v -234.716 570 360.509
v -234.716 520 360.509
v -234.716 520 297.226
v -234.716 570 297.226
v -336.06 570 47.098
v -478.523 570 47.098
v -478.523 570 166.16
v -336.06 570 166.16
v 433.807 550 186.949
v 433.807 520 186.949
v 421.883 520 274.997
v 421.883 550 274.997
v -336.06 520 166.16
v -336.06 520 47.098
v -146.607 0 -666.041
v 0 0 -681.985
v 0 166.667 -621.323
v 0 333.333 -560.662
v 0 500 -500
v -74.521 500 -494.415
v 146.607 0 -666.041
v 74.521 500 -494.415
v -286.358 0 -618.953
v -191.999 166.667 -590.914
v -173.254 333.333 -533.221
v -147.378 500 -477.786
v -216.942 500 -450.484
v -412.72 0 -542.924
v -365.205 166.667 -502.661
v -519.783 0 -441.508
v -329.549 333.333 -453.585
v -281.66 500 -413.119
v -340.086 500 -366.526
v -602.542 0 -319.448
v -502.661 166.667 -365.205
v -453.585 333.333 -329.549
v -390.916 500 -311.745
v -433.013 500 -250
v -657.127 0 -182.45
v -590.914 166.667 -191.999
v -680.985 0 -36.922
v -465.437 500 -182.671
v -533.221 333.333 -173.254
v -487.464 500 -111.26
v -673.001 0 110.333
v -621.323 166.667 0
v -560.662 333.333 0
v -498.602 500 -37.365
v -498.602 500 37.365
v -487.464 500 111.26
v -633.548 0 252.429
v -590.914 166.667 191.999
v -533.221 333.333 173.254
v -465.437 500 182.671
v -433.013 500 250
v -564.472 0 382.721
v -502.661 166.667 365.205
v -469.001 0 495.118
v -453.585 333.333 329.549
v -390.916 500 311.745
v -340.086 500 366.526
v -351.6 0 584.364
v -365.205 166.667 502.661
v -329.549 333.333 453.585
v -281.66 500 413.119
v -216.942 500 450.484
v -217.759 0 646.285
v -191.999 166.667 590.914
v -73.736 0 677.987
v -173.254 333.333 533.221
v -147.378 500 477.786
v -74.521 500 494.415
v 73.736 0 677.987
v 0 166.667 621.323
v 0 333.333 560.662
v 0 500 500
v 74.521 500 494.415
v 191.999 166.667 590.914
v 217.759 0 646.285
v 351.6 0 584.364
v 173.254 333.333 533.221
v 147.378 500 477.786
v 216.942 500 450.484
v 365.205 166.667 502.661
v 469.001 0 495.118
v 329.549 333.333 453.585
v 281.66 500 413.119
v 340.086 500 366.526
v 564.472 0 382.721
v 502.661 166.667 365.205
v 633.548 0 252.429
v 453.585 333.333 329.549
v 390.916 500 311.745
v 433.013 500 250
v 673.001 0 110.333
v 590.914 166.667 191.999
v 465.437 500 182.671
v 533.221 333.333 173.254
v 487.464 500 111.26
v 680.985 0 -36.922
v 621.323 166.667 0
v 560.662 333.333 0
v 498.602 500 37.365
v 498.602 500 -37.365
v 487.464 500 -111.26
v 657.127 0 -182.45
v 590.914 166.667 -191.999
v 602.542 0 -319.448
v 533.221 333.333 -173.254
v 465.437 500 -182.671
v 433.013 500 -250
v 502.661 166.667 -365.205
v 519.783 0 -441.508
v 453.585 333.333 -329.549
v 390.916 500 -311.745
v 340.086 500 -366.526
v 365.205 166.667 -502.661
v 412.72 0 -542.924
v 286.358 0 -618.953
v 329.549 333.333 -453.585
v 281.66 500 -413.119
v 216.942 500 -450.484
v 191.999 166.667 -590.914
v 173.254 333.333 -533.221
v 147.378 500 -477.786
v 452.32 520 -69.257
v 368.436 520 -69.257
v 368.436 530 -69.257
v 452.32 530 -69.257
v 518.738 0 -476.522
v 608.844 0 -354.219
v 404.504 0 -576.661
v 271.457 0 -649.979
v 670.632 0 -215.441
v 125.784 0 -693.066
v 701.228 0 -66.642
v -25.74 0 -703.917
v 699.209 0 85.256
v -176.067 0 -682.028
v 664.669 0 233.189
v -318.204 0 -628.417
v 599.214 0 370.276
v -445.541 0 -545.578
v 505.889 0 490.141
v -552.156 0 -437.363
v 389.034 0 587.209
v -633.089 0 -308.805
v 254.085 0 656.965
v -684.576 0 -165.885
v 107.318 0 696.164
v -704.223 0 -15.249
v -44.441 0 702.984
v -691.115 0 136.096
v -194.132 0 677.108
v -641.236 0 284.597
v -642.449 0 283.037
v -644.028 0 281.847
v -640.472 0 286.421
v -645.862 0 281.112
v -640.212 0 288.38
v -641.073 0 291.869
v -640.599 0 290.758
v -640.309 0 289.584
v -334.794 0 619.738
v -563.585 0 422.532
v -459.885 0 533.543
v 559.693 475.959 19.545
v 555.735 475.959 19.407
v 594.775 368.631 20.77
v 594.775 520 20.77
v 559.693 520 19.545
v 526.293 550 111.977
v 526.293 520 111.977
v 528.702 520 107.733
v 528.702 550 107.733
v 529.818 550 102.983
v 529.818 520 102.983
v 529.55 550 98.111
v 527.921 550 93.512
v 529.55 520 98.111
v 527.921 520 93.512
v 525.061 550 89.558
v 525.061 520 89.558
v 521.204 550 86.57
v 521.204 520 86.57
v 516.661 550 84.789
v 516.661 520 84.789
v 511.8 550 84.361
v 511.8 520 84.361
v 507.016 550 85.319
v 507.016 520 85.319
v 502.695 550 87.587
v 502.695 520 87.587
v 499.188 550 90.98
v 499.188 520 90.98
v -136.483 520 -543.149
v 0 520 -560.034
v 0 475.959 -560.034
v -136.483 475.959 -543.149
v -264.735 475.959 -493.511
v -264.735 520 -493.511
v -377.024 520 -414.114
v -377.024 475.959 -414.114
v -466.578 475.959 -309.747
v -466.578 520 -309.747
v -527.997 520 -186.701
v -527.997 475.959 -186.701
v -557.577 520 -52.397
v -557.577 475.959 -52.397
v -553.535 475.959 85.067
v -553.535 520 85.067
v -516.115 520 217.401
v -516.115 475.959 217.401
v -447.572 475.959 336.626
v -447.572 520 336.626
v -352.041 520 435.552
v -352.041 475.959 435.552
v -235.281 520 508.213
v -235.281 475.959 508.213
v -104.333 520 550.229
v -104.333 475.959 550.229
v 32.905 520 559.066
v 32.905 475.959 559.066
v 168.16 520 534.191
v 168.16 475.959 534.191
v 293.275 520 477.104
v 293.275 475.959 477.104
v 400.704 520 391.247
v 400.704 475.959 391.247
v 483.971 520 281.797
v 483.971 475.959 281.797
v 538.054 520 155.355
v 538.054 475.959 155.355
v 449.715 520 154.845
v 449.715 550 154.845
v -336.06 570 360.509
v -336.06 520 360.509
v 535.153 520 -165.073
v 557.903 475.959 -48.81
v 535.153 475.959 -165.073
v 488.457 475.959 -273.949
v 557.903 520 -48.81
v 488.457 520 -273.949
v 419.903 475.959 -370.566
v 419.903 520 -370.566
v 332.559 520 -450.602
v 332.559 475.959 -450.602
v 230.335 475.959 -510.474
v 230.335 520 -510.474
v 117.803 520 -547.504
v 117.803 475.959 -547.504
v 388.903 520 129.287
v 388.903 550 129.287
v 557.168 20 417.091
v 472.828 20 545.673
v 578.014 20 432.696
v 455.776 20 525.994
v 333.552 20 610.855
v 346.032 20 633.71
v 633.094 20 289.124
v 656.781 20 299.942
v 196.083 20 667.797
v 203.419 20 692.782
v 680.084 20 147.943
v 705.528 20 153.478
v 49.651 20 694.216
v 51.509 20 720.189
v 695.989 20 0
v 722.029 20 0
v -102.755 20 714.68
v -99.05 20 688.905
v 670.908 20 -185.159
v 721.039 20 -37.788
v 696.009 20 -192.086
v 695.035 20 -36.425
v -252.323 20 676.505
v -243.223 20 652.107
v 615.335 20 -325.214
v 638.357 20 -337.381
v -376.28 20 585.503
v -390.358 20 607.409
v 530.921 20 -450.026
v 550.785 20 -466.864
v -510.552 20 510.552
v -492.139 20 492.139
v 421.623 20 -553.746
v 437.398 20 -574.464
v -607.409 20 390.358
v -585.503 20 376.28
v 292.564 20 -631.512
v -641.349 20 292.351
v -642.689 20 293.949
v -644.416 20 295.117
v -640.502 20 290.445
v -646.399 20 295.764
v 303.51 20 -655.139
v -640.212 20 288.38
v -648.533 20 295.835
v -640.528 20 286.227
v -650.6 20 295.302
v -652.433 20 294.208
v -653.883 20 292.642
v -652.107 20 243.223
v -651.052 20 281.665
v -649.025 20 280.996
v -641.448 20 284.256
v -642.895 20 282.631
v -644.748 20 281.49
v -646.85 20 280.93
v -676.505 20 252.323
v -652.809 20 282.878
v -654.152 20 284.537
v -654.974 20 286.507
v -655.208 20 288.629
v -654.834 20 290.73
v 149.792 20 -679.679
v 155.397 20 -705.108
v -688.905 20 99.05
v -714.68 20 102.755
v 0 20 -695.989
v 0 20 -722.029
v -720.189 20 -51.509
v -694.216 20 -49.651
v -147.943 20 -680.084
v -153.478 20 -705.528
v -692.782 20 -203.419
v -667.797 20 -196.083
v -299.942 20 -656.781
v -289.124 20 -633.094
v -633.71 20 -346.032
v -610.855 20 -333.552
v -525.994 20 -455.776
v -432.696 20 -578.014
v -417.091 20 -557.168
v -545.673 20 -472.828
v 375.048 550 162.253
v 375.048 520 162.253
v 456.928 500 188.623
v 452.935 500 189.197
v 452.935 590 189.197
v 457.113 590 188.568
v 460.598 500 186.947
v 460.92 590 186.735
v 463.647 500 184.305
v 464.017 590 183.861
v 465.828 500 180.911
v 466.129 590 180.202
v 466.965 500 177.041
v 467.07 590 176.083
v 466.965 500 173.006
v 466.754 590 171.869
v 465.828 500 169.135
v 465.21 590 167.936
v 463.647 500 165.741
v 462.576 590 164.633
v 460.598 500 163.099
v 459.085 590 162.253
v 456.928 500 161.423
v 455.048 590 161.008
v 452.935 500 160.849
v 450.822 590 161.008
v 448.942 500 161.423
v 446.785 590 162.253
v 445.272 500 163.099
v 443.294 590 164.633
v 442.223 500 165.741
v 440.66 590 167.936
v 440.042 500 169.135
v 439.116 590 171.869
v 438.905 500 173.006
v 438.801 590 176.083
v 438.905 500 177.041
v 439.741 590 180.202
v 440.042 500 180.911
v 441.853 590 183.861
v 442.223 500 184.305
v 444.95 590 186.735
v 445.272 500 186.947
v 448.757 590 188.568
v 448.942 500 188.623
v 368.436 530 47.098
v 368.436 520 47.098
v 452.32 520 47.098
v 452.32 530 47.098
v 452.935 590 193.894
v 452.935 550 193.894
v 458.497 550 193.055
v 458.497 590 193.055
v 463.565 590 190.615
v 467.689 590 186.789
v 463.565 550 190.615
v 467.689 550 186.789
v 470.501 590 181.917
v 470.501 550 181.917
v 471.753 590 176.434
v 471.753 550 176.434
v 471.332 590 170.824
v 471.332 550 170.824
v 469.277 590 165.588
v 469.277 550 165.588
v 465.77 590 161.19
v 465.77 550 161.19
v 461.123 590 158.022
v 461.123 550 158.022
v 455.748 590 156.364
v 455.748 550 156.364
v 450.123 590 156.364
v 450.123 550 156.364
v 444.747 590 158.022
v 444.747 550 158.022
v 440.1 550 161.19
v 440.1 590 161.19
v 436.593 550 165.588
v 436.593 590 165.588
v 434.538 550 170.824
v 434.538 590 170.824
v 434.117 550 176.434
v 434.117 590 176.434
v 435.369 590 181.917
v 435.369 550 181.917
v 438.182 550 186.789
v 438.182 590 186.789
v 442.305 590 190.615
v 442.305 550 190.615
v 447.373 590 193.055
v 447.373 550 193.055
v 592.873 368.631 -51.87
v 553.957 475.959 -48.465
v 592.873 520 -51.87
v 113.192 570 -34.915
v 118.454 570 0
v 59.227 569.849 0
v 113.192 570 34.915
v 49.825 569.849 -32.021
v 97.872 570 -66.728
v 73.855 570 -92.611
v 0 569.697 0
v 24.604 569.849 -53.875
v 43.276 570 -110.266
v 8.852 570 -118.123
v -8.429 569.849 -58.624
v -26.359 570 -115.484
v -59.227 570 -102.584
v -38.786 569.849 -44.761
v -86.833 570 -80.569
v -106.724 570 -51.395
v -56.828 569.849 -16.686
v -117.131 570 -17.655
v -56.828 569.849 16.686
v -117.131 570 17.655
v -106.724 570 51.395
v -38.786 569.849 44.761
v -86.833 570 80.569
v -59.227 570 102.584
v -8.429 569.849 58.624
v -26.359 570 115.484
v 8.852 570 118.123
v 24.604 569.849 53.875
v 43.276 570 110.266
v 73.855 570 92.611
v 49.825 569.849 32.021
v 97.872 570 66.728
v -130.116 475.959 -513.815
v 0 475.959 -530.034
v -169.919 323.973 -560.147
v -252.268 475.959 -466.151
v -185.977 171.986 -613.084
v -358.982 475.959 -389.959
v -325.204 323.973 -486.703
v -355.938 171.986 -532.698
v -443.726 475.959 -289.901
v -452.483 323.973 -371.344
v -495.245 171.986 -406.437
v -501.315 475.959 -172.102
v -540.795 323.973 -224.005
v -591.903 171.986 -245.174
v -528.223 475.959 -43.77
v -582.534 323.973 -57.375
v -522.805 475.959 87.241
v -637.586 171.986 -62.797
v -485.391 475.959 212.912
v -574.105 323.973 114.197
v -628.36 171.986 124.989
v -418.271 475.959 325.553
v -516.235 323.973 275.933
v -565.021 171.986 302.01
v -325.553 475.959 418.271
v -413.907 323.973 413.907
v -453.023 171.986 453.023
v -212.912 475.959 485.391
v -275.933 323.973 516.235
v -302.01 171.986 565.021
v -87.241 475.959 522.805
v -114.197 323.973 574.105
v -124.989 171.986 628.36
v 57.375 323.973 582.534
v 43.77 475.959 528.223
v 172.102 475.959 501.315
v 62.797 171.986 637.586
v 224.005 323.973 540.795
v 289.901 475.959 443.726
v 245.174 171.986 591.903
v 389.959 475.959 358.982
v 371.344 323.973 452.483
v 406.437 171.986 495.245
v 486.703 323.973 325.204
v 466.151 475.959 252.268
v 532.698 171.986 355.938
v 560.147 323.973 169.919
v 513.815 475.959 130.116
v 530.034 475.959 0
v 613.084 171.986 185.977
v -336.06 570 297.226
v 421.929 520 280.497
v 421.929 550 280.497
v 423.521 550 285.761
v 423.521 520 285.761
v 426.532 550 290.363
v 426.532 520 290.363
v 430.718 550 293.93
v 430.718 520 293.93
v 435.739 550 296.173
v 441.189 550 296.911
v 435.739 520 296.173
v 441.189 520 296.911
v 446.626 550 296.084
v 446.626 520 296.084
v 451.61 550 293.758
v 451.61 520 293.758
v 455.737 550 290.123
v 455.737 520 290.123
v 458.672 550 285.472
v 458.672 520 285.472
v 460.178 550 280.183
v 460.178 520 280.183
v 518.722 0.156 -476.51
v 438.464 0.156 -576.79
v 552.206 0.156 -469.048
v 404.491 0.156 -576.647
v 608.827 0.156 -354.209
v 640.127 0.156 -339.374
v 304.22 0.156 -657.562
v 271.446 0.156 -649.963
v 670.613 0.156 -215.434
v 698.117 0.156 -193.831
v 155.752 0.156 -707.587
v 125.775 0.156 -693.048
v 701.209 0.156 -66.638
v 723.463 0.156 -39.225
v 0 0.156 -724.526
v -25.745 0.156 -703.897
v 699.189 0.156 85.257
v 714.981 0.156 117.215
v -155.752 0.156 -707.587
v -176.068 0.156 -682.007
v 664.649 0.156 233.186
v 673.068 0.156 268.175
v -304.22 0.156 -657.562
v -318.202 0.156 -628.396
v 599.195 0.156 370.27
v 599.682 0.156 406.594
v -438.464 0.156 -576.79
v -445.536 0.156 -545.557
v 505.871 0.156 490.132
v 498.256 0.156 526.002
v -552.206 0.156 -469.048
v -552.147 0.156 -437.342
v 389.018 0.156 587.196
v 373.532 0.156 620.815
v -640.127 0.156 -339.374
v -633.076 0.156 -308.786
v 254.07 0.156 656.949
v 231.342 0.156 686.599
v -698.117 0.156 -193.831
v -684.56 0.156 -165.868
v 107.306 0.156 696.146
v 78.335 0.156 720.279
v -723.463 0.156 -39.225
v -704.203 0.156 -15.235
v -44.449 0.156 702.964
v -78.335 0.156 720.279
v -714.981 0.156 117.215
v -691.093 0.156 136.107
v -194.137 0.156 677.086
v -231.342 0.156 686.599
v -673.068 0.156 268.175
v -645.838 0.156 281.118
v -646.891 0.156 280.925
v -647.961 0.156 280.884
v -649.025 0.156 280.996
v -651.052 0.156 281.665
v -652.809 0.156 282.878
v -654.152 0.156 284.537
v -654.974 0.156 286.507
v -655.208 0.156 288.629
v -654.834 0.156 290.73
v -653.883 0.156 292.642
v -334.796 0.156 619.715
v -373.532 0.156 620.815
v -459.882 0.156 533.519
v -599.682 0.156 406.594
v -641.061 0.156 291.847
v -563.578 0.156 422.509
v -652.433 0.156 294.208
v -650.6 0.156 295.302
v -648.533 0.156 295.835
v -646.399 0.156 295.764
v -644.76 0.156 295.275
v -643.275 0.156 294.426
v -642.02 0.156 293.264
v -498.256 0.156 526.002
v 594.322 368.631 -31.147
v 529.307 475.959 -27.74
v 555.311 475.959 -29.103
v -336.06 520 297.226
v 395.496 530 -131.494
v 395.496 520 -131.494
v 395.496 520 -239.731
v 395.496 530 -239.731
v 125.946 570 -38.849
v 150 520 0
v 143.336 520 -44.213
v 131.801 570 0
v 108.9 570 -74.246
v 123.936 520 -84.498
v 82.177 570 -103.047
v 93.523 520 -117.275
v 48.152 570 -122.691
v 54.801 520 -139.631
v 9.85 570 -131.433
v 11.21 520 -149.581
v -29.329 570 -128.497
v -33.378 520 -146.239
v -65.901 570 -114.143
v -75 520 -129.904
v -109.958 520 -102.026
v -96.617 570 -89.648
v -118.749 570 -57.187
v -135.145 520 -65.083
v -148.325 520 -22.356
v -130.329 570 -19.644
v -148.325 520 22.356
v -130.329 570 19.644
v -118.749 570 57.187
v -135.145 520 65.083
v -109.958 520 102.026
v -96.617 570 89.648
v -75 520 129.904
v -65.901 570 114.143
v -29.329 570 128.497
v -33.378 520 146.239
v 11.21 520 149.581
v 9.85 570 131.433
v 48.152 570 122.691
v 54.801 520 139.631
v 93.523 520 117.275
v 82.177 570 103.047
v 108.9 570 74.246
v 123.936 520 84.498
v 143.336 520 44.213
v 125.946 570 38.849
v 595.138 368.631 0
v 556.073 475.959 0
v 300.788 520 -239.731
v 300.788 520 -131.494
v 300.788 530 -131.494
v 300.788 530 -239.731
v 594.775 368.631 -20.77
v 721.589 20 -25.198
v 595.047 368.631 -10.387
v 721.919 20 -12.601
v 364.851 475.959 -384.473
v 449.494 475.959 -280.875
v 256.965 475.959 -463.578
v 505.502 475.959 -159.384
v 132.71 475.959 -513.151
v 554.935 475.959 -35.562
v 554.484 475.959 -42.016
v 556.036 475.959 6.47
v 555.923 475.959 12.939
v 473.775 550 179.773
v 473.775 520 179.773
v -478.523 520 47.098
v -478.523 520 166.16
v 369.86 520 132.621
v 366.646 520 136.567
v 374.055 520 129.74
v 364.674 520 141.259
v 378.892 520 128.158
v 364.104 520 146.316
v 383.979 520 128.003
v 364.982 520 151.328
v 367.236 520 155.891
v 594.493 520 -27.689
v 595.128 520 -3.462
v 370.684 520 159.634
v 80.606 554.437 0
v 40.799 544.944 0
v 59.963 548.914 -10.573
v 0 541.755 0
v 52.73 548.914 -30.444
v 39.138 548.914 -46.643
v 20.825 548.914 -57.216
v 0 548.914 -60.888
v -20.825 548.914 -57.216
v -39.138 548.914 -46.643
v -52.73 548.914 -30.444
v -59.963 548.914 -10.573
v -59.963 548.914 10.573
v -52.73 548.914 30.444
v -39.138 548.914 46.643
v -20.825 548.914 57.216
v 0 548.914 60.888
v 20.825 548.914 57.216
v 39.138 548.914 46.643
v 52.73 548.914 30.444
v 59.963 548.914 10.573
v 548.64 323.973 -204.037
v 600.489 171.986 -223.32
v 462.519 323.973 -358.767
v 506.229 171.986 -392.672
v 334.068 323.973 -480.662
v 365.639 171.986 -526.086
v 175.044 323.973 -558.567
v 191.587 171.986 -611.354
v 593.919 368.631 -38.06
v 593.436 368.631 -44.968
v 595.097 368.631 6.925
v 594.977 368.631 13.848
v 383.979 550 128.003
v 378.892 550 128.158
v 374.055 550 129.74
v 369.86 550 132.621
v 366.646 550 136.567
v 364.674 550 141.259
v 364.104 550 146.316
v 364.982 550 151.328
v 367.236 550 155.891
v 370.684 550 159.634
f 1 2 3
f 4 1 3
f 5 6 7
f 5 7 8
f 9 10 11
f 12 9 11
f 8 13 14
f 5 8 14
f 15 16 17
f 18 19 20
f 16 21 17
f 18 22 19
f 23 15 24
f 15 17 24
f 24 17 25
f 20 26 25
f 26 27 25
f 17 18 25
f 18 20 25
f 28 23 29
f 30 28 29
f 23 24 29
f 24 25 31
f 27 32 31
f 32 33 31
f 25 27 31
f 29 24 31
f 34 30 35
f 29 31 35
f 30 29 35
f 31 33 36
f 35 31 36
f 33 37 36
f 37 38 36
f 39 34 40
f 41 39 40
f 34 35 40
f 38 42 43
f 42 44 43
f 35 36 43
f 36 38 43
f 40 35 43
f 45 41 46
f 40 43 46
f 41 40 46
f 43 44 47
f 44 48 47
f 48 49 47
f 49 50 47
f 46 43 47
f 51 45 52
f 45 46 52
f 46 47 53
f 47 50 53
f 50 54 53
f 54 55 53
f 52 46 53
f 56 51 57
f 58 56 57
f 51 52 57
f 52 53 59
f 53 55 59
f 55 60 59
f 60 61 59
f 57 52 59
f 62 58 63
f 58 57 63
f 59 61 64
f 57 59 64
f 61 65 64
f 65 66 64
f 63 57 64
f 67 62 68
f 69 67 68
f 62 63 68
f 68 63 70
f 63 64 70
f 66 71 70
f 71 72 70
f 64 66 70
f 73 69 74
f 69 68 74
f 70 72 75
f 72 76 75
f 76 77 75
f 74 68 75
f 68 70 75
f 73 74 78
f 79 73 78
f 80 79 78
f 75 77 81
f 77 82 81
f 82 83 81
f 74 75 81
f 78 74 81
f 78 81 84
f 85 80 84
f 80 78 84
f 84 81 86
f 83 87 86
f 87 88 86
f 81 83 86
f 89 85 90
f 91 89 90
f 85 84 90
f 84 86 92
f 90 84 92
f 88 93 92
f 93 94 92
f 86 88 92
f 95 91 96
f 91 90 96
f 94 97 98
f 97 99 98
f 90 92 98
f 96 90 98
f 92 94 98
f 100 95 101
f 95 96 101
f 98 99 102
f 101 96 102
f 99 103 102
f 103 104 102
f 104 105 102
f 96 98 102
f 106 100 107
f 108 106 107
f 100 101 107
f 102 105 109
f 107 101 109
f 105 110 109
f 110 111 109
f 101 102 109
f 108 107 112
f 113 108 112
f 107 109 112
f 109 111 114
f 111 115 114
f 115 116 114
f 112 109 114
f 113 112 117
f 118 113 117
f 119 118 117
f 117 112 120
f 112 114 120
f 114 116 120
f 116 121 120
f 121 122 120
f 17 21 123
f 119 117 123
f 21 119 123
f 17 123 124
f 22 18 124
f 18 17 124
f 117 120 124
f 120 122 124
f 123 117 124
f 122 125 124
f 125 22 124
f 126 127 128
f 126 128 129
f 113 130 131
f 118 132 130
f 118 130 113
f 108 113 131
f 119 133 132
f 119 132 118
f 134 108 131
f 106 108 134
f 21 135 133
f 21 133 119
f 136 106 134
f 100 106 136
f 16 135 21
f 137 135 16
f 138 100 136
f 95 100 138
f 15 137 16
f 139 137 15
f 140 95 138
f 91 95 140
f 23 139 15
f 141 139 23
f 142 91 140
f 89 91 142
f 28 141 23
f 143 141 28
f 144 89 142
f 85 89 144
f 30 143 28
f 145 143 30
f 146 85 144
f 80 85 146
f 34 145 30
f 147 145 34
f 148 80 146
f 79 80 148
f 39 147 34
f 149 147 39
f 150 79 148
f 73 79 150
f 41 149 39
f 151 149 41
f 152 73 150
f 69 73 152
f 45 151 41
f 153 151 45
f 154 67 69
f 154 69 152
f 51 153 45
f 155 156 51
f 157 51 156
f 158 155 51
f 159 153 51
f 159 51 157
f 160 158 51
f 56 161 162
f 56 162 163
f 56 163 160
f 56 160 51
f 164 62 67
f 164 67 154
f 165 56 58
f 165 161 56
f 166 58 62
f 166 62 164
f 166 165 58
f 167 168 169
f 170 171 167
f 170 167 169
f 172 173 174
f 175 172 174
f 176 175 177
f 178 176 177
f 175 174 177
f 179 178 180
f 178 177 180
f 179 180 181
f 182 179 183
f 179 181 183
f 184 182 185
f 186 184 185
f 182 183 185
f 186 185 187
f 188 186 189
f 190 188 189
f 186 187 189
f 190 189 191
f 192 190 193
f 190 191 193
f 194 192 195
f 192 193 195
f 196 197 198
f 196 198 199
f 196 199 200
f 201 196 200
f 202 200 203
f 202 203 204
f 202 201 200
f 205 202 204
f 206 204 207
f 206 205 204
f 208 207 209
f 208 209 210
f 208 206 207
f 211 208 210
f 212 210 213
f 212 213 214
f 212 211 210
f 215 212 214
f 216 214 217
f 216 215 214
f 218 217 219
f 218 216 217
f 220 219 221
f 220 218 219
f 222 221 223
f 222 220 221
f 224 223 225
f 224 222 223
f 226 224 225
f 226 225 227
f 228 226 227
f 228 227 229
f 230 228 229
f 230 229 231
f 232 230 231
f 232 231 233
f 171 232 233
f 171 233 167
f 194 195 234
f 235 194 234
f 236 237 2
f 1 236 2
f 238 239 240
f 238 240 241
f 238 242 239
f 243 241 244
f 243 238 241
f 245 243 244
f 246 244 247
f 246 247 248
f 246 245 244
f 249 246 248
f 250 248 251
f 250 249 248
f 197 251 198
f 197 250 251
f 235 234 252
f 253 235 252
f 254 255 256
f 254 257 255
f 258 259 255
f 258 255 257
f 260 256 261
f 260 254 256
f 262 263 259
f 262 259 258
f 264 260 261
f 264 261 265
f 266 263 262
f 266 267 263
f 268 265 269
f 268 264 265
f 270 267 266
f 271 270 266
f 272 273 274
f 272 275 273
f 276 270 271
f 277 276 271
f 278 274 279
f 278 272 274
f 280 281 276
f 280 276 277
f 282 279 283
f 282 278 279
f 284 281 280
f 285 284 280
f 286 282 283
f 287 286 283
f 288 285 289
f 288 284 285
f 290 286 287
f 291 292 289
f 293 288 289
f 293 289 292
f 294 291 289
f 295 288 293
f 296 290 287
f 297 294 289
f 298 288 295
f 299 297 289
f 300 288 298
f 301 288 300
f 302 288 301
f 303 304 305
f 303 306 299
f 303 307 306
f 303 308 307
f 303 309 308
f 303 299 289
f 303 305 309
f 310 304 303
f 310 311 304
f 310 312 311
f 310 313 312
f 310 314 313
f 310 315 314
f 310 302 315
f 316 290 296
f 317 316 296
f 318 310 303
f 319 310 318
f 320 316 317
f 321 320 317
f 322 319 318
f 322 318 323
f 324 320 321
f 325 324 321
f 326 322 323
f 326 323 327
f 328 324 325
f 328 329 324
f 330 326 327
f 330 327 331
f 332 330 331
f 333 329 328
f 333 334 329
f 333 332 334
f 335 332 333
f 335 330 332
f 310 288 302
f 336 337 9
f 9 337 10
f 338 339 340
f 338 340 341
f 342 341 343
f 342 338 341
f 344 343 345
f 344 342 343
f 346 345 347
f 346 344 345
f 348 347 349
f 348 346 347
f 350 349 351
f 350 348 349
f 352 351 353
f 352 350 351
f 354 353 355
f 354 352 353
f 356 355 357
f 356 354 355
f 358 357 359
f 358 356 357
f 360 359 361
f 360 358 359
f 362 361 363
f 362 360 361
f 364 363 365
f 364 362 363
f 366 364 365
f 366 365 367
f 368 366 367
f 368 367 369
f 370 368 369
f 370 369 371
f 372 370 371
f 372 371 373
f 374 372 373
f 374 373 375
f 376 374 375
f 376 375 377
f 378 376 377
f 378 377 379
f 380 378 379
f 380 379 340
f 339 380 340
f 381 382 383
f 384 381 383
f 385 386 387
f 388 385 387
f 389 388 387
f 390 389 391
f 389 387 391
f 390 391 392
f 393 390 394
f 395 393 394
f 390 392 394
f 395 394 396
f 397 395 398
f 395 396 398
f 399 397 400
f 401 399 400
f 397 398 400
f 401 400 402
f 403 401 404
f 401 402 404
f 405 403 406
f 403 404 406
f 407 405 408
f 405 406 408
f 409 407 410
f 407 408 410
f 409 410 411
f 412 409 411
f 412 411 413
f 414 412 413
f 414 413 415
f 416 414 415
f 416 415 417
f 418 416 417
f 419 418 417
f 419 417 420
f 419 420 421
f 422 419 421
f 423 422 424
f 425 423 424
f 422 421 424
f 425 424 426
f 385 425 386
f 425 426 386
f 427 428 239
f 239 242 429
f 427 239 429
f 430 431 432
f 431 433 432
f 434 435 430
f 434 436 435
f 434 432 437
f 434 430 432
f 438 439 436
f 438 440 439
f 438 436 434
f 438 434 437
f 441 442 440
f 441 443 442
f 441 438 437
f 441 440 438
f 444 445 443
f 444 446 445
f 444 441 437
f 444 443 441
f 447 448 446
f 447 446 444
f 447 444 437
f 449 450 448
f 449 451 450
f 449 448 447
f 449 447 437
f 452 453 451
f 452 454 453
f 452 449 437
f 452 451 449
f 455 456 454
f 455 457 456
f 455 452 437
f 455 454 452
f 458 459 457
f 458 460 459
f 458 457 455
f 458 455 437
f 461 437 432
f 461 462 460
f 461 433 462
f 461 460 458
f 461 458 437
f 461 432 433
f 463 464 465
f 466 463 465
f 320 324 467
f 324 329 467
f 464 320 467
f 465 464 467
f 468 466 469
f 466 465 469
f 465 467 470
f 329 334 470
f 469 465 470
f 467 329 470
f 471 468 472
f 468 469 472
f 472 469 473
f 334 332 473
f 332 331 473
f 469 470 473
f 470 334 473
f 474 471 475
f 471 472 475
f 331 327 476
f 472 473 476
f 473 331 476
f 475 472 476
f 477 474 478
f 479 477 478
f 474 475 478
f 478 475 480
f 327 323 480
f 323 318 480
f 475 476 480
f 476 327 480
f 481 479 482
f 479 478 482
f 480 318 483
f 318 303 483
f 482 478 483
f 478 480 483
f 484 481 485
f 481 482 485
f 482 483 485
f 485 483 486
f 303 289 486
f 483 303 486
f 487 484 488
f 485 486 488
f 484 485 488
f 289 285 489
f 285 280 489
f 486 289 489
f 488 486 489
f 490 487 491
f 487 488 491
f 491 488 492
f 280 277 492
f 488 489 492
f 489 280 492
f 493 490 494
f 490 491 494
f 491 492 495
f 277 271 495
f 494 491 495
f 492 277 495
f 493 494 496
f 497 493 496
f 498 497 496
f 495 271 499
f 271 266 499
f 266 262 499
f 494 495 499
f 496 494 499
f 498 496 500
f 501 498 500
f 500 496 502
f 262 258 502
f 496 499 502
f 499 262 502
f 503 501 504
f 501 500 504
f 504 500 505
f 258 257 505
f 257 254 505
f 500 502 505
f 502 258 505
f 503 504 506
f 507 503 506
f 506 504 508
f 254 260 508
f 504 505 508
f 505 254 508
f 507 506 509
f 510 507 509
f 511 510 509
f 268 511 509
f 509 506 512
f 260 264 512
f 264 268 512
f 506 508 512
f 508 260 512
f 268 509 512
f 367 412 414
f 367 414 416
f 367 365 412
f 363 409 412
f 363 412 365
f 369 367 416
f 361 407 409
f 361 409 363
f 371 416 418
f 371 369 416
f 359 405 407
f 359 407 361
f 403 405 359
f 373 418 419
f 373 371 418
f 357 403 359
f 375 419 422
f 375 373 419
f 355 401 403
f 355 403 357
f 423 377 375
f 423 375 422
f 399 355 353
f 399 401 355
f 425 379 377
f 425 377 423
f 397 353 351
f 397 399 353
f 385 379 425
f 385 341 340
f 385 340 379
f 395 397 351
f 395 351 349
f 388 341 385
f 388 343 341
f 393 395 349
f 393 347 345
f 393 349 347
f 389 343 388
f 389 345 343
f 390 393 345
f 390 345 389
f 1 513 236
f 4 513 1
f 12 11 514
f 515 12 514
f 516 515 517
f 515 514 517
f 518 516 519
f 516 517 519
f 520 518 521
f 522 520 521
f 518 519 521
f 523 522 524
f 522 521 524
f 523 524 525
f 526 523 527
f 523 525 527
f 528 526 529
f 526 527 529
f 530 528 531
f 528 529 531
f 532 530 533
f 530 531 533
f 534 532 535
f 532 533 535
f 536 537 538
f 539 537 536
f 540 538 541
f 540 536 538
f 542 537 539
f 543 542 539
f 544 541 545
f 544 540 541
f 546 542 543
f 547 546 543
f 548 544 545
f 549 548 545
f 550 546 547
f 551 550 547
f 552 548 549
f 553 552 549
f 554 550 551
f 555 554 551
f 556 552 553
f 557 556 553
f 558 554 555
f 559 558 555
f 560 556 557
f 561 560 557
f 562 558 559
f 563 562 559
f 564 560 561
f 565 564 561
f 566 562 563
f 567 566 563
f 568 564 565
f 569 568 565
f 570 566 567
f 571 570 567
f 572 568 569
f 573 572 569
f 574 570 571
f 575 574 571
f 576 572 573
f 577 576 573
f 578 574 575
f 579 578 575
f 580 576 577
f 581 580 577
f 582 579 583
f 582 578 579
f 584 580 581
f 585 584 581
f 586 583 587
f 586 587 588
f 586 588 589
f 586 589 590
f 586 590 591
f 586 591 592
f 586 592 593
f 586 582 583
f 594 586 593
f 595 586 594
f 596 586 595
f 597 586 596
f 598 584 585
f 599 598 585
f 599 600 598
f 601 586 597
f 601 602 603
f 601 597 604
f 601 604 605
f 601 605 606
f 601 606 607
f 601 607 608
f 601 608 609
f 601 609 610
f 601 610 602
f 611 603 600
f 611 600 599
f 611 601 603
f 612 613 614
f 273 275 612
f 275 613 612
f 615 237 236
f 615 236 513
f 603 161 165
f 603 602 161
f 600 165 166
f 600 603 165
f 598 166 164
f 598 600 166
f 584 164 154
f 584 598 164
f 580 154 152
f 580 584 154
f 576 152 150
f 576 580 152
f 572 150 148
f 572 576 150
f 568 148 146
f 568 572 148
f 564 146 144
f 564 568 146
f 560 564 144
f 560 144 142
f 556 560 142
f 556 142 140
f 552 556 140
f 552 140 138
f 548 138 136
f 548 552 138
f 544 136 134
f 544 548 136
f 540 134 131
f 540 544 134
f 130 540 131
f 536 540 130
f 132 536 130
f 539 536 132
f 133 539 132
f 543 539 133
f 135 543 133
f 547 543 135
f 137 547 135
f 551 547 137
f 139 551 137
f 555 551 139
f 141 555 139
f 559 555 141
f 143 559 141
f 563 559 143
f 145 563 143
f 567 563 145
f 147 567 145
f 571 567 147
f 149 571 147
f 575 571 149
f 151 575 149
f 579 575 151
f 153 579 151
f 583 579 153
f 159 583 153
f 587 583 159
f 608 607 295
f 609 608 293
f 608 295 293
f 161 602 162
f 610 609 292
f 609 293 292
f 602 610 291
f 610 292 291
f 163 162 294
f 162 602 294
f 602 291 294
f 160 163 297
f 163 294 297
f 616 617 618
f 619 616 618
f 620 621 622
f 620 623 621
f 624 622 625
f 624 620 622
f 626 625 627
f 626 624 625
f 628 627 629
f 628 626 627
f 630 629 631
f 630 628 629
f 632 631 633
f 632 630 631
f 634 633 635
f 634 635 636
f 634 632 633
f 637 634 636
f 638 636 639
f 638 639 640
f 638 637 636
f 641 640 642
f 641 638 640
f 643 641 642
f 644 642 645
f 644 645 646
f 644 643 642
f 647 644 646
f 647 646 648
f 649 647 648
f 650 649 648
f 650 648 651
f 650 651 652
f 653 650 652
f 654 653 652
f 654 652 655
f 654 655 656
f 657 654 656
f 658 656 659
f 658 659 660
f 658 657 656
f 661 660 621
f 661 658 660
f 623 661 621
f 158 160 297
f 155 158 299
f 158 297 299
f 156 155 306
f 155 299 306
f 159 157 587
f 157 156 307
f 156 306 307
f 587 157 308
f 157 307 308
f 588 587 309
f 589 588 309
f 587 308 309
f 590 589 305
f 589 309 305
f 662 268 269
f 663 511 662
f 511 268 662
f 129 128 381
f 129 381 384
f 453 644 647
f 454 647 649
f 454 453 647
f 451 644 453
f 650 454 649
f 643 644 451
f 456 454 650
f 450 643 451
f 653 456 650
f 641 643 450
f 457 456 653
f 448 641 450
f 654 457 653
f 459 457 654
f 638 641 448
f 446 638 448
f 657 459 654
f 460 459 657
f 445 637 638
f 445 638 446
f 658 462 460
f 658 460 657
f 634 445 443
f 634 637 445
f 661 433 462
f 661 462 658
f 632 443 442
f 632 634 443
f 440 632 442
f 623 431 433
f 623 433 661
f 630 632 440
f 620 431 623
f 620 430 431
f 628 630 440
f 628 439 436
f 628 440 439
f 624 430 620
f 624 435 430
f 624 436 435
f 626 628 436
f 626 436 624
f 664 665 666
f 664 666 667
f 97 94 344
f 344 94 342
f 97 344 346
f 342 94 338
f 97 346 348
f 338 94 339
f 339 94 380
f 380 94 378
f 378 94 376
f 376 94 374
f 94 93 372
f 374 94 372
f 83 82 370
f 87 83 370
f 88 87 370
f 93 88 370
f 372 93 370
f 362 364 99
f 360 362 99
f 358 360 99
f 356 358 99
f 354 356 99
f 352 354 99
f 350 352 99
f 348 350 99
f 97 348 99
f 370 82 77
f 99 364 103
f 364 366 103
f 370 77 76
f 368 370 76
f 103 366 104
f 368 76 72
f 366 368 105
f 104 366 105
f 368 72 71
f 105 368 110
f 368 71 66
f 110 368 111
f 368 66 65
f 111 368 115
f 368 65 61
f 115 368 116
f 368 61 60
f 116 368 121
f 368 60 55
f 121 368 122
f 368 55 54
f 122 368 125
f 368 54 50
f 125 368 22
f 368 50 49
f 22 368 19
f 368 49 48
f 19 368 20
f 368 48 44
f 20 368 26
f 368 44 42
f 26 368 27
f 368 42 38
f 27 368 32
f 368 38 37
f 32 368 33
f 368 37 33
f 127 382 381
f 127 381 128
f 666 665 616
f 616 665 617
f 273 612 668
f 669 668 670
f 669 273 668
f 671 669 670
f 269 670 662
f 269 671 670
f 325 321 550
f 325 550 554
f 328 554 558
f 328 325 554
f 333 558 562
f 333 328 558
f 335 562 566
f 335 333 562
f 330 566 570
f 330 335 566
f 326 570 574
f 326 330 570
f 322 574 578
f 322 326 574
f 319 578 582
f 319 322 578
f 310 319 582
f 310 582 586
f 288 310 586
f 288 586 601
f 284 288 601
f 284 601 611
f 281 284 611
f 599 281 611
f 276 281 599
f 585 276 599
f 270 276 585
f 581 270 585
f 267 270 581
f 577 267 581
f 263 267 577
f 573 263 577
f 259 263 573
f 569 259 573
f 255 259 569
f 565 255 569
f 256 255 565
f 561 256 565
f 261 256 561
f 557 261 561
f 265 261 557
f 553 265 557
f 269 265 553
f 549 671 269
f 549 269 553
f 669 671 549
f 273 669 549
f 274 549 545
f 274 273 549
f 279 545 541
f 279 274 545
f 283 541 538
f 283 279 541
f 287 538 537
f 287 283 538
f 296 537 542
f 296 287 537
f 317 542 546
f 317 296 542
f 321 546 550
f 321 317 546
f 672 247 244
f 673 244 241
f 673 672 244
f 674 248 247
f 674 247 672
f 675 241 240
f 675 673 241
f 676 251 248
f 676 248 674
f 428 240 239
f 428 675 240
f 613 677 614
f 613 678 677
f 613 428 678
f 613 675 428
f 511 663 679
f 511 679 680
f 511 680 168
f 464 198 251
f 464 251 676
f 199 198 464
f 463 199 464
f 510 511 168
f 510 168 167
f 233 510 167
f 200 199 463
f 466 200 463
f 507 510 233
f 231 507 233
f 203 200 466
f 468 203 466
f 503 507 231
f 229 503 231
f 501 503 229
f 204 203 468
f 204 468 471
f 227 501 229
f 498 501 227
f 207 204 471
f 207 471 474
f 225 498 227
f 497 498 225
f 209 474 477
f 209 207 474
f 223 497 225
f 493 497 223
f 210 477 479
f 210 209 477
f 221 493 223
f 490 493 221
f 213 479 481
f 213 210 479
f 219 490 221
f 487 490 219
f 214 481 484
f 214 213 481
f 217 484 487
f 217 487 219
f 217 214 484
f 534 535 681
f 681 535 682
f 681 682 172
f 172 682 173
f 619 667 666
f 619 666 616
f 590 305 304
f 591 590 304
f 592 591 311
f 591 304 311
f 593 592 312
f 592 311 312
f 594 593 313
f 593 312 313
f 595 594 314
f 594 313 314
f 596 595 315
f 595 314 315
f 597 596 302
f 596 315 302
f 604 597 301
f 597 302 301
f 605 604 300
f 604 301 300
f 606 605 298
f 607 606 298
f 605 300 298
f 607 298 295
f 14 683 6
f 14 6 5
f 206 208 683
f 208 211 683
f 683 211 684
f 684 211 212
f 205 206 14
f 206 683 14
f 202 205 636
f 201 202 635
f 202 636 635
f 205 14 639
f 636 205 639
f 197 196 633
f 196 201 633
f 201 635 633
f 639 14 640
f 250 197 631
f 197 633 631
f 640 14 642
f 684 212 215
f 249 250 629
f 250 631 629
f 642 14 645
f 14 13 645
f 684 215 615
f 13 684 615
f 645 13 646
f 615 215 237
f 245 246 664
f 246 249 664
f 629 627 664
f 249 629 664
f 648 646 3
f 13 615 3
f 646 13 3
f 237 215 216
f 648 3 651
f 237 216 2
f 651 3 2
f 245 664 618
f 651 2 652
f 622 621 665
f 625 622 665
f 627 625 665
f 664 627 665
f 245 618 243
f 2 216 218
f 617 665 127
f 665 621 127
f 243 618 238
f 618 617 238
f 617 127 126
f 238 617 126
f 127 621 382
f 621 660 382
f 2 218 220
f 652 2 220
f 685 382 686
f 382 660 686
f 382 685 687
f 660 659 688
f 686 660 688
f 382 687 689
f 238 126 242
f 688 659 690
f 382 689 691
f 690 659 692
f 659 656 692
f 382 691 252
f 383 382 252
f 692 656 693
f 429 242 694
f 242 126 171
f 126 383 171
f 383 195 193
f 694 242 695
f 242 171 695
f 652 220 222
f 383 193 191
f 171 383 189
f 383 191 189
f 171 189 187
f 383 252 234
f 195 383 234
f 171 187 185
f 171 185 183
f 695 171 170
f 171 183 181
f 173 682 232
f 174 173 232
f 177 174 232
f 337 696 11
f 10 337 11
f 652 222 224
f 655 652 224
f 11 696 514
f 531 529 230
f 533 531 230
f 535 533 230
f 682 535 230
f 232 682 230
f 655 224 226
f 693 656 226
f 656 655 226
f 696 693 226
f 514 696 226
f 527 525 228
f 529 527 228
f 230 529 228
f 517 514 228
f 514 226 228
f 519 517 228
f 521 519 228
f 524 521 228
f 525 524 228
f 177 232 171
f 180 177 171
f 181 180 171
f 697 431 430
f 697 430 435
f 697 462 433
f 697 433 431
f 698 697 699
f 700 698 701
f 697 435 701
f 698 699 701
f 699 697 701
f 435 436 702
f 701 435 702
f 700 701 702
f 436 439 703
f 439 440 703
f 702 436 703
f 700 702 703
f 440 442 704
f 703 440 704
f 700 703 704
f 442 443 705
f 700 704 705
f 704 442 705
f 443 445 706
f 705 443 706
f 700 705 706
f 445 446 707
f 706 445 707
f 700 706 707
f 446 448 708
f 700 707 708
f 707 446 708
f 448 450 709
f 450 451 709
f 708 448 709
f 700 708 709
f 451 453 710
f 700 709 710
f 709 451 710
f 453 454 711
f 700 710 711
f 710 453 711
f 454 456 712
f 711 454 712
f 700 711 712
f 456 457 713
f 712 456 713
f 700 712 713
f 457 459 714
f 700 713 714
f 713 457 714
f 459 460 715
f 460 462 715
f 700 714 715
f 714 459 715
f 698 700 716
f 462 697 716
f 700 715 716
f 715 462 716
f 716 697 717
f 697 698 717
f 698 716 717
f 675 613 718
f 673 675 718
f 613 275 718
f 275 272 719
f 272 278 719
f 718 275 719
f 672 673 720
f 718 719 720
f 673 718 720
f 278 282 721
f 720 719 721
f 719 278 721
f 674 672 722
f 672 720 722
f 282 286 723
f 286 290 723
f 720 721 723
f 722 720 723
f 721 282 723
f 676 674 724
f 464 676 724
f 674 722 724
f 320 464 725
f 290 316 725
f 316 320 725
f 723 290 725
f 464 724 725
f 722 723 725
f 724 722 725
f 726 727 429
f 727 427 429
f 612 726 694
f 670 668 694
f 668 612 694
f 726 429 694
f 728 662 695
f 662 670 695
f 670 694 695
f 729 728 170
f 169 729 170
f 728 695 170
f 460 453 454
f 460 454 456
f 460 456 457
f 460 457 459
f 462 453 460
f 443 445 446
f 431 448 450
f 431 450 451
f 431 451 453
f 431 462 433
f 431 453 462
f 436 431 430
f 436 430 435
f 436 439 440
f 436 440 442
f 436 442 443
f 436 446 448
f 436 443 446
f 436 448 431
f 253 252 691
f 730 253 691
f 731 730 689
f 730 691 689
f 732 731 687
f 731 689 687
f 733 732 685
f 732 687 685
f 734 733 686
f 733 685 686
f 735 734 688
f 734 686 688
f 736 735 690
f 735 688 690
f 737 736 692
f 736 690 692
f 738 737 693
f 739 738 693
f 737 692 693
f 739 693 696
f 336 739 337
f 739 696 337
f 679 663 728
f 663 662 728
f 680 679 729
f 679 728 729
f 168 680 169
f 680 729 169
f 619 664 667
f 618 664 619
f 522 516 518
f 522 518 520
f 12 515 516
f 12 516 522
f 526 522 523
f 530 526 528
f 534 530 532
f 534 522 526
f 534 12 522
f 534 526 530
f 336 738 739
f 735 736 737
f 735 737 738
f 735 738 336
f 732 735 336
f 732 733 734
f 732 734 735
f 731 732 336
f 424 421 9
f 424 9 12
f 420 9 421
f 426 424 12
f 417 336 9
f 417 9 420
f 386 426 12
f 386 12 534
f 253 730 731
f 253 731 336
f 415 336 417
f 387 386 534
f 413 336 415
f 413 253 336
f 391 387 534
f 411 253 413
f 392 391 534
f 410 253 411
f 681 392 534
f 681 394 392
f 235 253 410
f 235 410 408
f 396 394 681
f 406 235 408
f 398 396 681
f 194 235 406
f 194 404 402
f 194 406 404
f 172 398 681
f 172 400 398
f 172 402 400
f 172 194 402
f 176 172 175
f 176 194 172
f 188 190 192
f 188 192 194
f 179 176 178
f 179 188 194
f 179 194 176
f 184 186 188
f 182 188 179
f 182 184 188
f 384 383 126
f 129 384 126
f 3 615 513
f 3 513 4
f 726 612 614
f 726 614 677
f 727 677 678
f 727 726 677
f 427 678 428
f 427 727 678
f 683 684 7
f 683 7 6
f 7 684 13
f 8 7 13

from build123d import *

# Parameters (mm, degrees)
REVOLVE_4_ANGLE           = 5
REVOLVE_4_OTHER_WAY_ANGLE = 2
CUT_EXTRUDE_1_DEPTH       = 1141.120605351
SKETCH_5_R                = 150
EXTRUDE_3_DEPTH           = 50
EXTRUDE_3_TAPER           = 20
SKETCH_9_W                = 101.343282943
SKETCH_9_H                = 63.282990441
SKETCH_9_W_2              = 142.463314855
SKETCH_9_H_2              = 119.061357177
EXTRUDE_5_DEPTH           = 50
SKETCH_9_3_W              = 101.343282943
SKETCH_9_3_H              = 63.282990441
SKETCH_9_3_W_2            = 142.463314855
SKETCH_9_3_H_2            = 119.061357177
SKETCH_9_3_W_3            = 94.707897755
SKETCH_9_3_H_3            = 108.237597434
SKETCH_9_3_W_4            = 83.884138011
SKETCH_9_3_H_4            = 116.355417242
EXTRUDE_6_DEPTH           = 10
EXTRUDE_10_DEPTH          = 30
SKETCH_11_R               = 18.870411167
EXTRUDE_11_DEPTH          = 40
CUT_EXTRUDE_2_DEPTH       = 40
CUT_EXTRUDE_2_DEPTH_BACK  = 1163.91658981
SKETCH_11_3_R             = 14.174126535


with BuildPart() as part:
    # 草图2 → 旋转2 (revolve)
    with BuildSketch(Plane.XY, mode=Mode.PRIVATE) as revolve_2_sk:
        Polygon((0, 520), (514.004150764, 520), (703.268672583, 0), (681.985117133, 0), (500, 500), (0, 500), align=None)
        Polygon((722.028861107, 20), (695.989267897, 20), (703.268672583, 0), (704.38769136, 0), (704.36800355, 0.156467804), (724.525705115, 0.156467804), align=None)
        with BuildLine():
            Line((560.03375626, 520), (514.004150764, 520))
            Line((514.004150764, 520), (522.853935072, 495.685417448))
            ThreePointArc((522.853935072, 495.685417448), (533.278359551, 508.108762772), (547.323148659, 500))
            Line((547.323148659, 500), (560.03375626, 520))
        make_face()
        Polygon((560.03375626, 475.959020857), (560.03375626, 520), (547.323148659, 500), (556.07334947, 475.959020857), align=None)
        with BuildLine():
            ThreePointArc((547.323148659, 500), (533.278359551, 508.108762772), (522.853935072, 495.685417448))
            Line((522.853935072, 495.685417448), (530.03375626, 475.959020857))
            Line((530.03375626, 475.959020857), (556.07334947, 475.959020857))
            Line((556.07334947, 475.959020857), (547.323148659, 500))
        make_face()
    revolve(revolve_2_sk.sketch.rotate(Axis((0, 0, 0), (0, 1, 0)), 90), axis=Axis((0, 0, 0), (0, 1, 0)))

    # 旋转3: read off the stored shape, not the designer's step
    # 旋转3: loft between two sections, ruled curve by curve
    revolve_3_from = [
        Edge.make_three_point_arc((555.311270271, 475.959020857, -29.102630486), (555.882797021, 475.959020857, -14.556303324), (556.07334947, 475.959020857, 0)),
        Edge.make_line((529.307363418, 475.959020857, -27.739823475), (555.311270271, 475.959020857, -29.102630486)),
        Edge.make_line((556.07334947, 475.959020857, 0), (530.03375626, 475.959020857, 0)),
        Edge.make_line((530.03375626, 475.959020857, 0), (529.307363418, 475.959020857, -27.739823475)),
    ]
    revolve_3_to = [
        Edge.make_three_point_arc((721.039345647, 20, -37.788070881), (721.78143985, 20, -18.900512174), (722.028861107, 20, 0)),
        Edge.make_line((695.035438794, 20, -36.42526387), (721.039345647, 20, -37.788070881)),
        Edge.make_line((722.028861107, 20, 0), (695.989267897, 20, 0)),
        Edge.make_line((695.989267897, 20, 0), (695.035438794, 20, -36.42526387)),
    ]
    revolve_3 = Solid(Shell([*[Face.make_surface_from_curves(revolve_3_from[k], revolve_3_to[k]) for k in range(4)], Face(Wire(revolve_3_from)), Face(Wire(revolve_3_to))]))
    add(revolve_3)

    # 草图2<11> → 旋转4 (revolve)
    with BuildSketch(Plane.XY):
        Polygon((595.137670099, 520), (560.03375626, 520), (560.03375626, 475.959020857), (556.07334947, 475.959020857), (595.137670099, 368.630682023), align=None)
    revolve(axis=Axis((0, 0, 0), (0, 1, 0)), revolution_arc=REVOLVE_4_ANGLE)

    # 草图2<11> → 旋转4 other way (revolve)
    with BuildSketch(Plane.XY):
        Polygon((595.137670099, 520), (560.03375626, 520), (560.03375626, 475.959020857), (556.07334947, 475.959020857), (595.137670099, 368.630682023), align=None)
    revolve(axis=Axis((0, 0, 0), (0, -1, 0)), revolution_arc=REVOLVE_4_OTHER_WAY_ANGLE)

    # 草图3 → 切除-拉伸1 (cut, through all)
    with BuildSketch(Plane(origin=(0, 20, 0), x_dir=(1, 0, 0), z_dir=(0, 1, 0))):
        with BuildLine():
            ThreePointArc((-649.025028468, -280.995795674), (-655.096181435, -289.69298497), (-646.398992139, -295.764137937))
            Line((-646.398992139, -295.764137937), (-649.025028468, -280.995795674))
        make_face()
        with BuildLine():
            Line((-649.025028468, -280.995795674), (-646.398992139, -295.764137937))
            ThreePointArc((-646.398992139, -295.764137937), (-641.963200156, -293.196727323), (-640.212010303, -288.379966806))
            ThreePointArc((-640.212010303, -288.379966806), (-642.895249786, -282.631156658), (-649.025028468, -280.995795674))
        make_face()
    extrude(amount=-CUT_EXTRUDE_1_DEPTH, mode=Mode.SUBTRACT)

    # 草图5 → 凸台-拉伸3 (add)
    with BuildSketch(Plane(origin=(0, 520, 0), x_dir=(1, 0, 0), z_dir=(0, 1, 0))):
        Circle(SKETCH_5_R)
    extrude(amount=EXTRUDE_3_DEPTH, taper=EXTRUDE_3_TAPER)

    # 切除-旋转4: read off the stored shape, not the designer's step
    # 切除-旋转4 outline → 切除-旋转4 (revolve, cut)
    with BuildSketch(Plane.XY):
        with BuildLine():
            Line((0, 570.0000001), (0, 541.754654672))
            ThreePointArc((0, 541.754654672), (60.887636923, 548.913608554), (118.45428562, 570.0000001))
            Line((118.45428562, 570.0000001), (0, 570.0000001))
        make_face()
    revolve(axis=Axis((0, 0, 0), (0, 1, 0)), mode=Mode.SUBTRACT)

    # 草图9 → 凸台-拉伸5 (add)
    with BuildSketch(Plane(origin=(0, 520, 0), x_dir=(1, 0, 0), z_dir=(0, 1, 0))):
        with Locations((-285.388042794, -328.86758542)):
            Rectangle(SKETCH_9_W, SKETCH_9_H)
        with Locations((-407.291341693, -106.628821994)):
            Rectangle(SKETCH_9_W_2, SKETCH_9_H_2)
    extrude(amount=EXTRUDE_5_DEPTH)

    # 草图9<3> → 凸台-拉伸6 (add)
    with BuildSketch(Plane(origin=(0, 520, 0), x_dir=(1, 0, 0), z_dir=(0, 1, 0))):
        with Locations((-285.388042794, -328.86758542)):
            Rectangle(SKETCH_9_3_W, SKETCH_9_3_H)
        with Locations((-407.291341693, -106.628821994)):
            Rectangle(SKETCH_9_3_W_2, SKETCH_9_3_H_2)
        with Locations((348.141651282, 185.612691078)):
            Rectangle(SKETCH_9_3_W_3, SKETCH_9_3_H_3)
        with Locations((410.378269806, 11.079565216)):
            Rectangle(SKETCH_9_3_W_4, SKETCH_9_3_H_4)
    extrude(amount=EXTRUDE_6_DEPTH)

    # 草图10 → 凸台-拉伸10 (add)
    with BuildSketch(Plane(origin=(0, 520, 0), x_dir=(1, 0, 0), z_dir=(0, 1, 0))):
        with BuildLine():
            Line((499.188166712, -90.979819427), (449.714835378, -154.845392603))
            Line((449.714835378, -154.845392603), (388.90299653, -129.286793666))
            ThreePointArc((388.90299653, -129.286793666), (365.492203191, -138.842219519), (375.047629043, -162.253012857))
            Line((375.047629043, -162.253012857), (433.806642006, -186.9488299))
            Line((433.806642006, -186.9488299), (421.883436355, -274.997117784))
            ThreePointArc((421.883436355, -274.997117784), (438.437846493, -296.73724676), (460.17797547, -280.182836622))
            Line((460.17797547, -280.182836622), (473.775090623, -179.773370873))
            Line((473.775090623, -179.773370873), (526.29348556, -111.976897408))
            ThreePointArc((526.29348556, -111.976897408), (523.239365127, -87.925698993), (499.188166712, -90.979819427))
        make_face()
    extrude(amount=EXTRUDE_10_DEPTH)

    # 草图11 → 凸台-拉伸11 (add)
    with BuildSketch(Plane(origin=(0, 550, 0), x_dir=(1, 0, 0), z_dir=(0, 1, 0))):
        with Locations(Location((452.935034731, -175.023325275, 0), (0, 0, 270))):
            Circle(SKETCH_11_R)
    extrude(amount=EXTRUDE_11_DEPTH)

    # 草图11<3> → 切除-拉伸2 (cut, two sides: drawn at the far end of the back side and taken through both)
    with BuildSketch(Plane(origin=(0, 550, 0), x_dir=(1, 0, 0), z_dir=(0, 1, 0)).offset(-CUT_EXTRUDE_2_DEPTH_BACK)):
        with Locations(Location((452.935034731, -175.023325275, 0), (0, 0, 270))):
            Circle(SKETCH_11_3_R)
    extrude(amount=CUT_EXTRUDE_2_DEPTH + CUT_EXTRUDE_2_DEPTH_BACK, mode=Mode.SUBTRACT)


with BuildPart() as body_2:
    # Cut-Revolve 4 2 outline → Cut-Revolve 4 2 (revolve)
    with BuildSketch(Plane.XY):
        Polygon((118.454285423, 570), (0, 570), (0, 569.697196729), align=None)
    revolve(axis=Axis((0, 0, 0), (0, 1, 0)))


solid = Compound([part.part, body_2.part])
